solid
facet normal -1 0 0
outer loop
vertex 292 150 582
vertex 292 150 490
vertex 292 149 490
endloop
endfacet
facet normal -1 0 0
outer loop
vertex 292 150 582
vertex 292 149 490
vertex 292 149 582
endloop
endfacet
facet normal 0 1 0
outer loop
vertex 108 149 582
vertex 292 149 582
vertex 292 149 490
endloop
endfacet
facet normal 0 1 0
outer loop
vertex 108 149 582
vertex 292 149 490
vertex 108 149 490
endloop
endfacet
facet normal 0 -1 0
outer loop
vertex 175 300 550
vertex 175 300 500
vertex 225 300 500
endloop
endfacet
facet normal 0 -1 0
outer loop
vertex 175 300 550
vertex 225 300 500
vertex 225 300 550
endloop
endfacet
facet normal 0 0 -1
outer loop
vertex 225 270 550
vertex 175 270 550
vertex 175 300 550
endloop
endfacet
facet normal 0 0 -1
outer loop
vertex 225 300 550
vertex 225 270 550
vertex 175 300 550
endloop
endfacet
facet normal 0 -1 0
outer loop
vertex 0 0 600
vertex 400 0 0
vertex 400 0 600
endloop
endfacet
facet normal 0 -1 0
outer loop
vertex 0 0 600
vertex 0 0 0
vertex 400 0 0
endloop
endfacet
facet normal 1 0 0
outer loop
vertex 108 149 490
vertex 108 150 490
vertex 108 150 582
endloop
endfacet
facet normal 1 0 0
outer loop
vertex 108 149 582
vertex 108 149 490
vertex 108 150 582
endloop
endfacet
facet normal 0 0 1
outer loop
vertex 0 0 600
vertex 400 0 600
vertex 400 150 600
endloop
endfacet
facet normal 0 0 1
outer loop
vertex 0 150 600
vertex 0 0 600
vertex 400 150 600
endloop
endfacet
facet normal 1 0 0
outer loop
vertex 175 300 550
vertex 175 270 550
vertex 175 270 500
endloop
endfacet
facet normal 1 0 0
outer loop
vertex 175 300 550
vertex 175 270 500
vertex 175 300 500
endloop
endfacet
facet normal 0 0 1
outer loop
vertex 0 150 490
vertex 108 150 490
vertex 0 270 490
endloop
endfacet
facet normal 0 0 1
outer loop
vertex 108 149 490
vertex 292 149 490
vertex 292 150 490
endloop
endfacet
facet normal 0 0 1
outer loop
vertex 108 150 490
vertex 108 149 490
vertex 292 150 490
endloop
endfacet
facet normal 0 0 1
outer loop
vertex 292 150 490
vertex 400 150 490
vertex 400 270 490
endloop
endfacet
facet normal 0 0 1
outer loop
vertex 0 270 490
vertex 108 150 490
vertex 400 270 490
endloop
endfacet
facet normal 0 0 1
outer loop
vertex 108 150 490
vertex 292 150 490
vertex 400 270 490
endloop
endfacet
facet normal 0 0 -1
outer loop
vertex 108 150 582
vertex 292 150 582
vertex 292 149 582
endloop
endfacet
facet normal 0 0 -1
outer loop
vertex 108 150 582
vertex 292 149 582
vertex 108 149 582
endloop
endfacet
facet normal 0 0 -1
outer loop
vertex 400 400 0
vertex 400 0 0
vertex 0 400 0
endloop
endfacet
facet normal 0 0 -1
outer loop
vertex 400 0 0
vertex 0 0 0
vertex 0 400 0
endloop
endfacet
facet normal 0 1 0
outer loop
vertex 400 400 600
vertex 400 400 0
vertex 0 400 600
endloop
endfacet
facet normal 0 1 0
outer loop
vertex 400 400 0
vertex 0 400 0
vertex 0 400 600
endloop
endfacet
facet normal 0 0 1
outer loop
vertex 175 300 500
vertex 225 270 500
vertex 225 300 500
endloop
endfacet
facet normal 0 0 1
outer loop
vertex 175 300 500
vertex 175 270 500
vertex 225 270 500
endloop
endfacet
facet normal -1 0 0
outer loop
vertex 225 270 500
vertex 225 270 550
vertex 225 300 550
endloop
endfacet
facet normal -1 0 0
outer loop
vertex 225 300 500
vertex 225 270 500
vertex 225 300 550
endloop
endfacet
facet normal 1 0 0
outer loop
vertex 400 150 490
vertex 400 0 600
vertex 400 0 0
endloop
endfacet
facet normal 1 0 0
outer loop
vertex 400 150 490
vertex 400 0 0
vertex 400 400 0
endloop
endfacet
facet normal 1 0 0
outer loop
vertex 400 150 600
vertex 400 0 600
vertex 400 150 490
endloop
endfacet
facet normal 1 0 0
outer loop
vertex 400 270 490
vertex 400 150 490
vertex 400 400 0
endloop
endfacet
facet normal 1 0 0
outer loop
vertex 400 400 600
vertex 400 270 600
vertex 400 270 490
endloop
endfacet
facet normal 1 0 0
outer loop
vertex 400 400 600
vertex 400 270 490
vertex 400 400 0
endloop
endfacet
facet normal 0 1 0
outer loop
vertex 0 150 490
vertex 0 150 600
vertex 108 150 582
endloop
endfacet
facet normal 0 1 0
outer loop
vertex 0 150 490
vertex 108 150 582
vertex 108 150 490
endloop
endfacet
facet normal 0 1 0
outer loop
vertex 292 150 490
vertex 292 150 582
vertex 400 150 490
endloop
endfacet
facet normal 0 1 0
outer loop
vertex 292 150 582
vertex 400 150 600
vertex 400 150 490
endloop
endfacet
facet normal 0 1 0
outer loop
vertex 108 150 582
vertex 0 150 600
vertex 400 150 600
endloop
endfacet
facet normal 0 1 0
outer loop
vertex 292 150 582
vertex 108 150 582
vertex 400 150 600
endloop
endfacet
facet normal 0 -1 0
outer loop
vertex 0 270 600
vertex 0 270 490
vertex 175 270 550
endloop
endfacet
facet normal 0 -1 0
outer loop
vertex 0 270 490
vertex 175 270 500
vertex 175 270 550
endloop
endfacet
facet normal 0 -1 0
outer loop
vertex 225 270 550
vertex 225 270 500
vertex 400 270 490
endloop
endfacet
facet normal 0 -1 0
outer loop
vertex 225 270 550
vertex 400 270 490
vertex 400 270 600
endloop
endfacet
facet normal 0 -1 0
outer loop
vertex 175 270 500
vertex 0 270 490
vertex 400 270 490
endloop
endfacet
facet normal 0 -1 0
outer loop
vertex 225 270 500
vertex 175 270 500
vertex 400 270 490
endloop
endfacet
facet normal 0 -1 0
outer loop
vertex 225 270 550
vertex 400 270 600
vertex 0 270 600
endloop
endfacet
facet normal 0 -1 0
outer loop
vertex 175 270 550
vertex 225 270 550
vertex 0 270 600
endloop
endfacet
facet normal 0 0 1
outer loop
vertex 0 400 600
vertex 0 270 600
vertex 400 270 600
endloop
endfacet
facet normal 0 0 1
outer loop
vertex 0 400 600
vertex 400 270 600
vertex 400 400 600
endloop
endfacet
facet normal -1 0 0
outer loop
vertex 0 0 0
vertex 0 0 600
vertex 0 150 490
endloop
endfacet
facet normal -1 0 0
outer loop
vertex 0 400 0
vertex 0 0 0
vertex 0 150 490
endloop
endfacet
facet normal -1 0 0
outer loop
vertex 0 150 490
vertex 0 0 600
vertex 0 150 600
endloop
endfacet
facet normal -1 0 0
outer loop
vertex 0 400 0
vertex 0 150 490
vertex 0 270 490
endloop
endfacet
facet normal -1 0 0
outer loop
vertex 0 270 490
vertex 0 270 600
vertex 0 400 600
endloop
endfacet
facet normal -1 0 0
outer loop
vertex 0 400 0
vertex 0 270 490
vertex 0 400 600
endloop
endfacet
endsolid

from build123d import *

# Parameters (mm, degrees)
F0_W        = 400
F0_H        = 600
F1_DEPTH    = 200
F2_W        = 30
F2_H        = 50
F3_DEPTH    = 25
F1_FACE_W   = 400
F1_FACE_H   = 600
F1_FACE_W_2 = 30
F1_FACE_H_2 = 50
F4_DEPTH    = 25
F5_W        = 400
F5_H        = 600
F6_DEPTH    = 175
F8_DEPTH    = 400.001
F9_W        = 184
F9_H        = 92
F10_DEPTH   = 1


with BuildPart() as f1:
    # F0 (on Right) → F1 (new body)
    with BuildSketch(Plane.YZ):
        with Locations((200, 300)):
            Rectangle(F0_W, F0_H)
    extrude(amount=F1_DEPTH)

    # F2 (on face) → F3 (cut)
    with BuildSketch(Plane.YZ.offset(200)):
        with Locations((285, 525)):
            Rectangle(F2_W, F2_H)
    extrude(amount=-F3_DEPTH, mode=Mode.SUBTRACT)

    # F1_face (on face) → F4 (join)
    with BuildSketch(Plane(origin=(200, 200, 300), x_dir=(0, 1, 0), z_dir=(1, 0, 0))):
        Rectangle(F1_FACE_W, F1_FACE_H)
        with Locations((85, 225)):
            Rectangle(F1_FACE_W_2, F1_FACE_H_2, mode=Mode.SUBTRACT)
    extrude(amount=F4_DEPTH)

    # F5 (on face) → F6 (join)
    with BuildSketch(Plane.YZ.offset(225)):
        with Locations((200, 300)):
            Rectangle(F5_W, F5_H)
    extrude(amount=F6_DEPTH)

    # F7 (on face) → F8 (cut, through all)
    with BuildSketch(Plane.YZ.offset(400)):
        Polygon((270, 550), (270, 600), (150, 600), (150, 490), (270, 490), (270, 500), align=None)
    extrude(amount=-F8_DEPTH, mode=Mode.SUBTRACT)

    # F9 (on face) → F10 (cut)
    with BuildSketch(Plane(origin=(0, 150, 0), x_dir=(-1, 0, 0), z_dir=(0, 1, 0))):
        with Locations((-200, 536)):
            Rectangle(F9_W, F9_H)
    extrude(amount=-F10_DEPTH, mode=Mode.SUBTRACT)


solid = f1.part
